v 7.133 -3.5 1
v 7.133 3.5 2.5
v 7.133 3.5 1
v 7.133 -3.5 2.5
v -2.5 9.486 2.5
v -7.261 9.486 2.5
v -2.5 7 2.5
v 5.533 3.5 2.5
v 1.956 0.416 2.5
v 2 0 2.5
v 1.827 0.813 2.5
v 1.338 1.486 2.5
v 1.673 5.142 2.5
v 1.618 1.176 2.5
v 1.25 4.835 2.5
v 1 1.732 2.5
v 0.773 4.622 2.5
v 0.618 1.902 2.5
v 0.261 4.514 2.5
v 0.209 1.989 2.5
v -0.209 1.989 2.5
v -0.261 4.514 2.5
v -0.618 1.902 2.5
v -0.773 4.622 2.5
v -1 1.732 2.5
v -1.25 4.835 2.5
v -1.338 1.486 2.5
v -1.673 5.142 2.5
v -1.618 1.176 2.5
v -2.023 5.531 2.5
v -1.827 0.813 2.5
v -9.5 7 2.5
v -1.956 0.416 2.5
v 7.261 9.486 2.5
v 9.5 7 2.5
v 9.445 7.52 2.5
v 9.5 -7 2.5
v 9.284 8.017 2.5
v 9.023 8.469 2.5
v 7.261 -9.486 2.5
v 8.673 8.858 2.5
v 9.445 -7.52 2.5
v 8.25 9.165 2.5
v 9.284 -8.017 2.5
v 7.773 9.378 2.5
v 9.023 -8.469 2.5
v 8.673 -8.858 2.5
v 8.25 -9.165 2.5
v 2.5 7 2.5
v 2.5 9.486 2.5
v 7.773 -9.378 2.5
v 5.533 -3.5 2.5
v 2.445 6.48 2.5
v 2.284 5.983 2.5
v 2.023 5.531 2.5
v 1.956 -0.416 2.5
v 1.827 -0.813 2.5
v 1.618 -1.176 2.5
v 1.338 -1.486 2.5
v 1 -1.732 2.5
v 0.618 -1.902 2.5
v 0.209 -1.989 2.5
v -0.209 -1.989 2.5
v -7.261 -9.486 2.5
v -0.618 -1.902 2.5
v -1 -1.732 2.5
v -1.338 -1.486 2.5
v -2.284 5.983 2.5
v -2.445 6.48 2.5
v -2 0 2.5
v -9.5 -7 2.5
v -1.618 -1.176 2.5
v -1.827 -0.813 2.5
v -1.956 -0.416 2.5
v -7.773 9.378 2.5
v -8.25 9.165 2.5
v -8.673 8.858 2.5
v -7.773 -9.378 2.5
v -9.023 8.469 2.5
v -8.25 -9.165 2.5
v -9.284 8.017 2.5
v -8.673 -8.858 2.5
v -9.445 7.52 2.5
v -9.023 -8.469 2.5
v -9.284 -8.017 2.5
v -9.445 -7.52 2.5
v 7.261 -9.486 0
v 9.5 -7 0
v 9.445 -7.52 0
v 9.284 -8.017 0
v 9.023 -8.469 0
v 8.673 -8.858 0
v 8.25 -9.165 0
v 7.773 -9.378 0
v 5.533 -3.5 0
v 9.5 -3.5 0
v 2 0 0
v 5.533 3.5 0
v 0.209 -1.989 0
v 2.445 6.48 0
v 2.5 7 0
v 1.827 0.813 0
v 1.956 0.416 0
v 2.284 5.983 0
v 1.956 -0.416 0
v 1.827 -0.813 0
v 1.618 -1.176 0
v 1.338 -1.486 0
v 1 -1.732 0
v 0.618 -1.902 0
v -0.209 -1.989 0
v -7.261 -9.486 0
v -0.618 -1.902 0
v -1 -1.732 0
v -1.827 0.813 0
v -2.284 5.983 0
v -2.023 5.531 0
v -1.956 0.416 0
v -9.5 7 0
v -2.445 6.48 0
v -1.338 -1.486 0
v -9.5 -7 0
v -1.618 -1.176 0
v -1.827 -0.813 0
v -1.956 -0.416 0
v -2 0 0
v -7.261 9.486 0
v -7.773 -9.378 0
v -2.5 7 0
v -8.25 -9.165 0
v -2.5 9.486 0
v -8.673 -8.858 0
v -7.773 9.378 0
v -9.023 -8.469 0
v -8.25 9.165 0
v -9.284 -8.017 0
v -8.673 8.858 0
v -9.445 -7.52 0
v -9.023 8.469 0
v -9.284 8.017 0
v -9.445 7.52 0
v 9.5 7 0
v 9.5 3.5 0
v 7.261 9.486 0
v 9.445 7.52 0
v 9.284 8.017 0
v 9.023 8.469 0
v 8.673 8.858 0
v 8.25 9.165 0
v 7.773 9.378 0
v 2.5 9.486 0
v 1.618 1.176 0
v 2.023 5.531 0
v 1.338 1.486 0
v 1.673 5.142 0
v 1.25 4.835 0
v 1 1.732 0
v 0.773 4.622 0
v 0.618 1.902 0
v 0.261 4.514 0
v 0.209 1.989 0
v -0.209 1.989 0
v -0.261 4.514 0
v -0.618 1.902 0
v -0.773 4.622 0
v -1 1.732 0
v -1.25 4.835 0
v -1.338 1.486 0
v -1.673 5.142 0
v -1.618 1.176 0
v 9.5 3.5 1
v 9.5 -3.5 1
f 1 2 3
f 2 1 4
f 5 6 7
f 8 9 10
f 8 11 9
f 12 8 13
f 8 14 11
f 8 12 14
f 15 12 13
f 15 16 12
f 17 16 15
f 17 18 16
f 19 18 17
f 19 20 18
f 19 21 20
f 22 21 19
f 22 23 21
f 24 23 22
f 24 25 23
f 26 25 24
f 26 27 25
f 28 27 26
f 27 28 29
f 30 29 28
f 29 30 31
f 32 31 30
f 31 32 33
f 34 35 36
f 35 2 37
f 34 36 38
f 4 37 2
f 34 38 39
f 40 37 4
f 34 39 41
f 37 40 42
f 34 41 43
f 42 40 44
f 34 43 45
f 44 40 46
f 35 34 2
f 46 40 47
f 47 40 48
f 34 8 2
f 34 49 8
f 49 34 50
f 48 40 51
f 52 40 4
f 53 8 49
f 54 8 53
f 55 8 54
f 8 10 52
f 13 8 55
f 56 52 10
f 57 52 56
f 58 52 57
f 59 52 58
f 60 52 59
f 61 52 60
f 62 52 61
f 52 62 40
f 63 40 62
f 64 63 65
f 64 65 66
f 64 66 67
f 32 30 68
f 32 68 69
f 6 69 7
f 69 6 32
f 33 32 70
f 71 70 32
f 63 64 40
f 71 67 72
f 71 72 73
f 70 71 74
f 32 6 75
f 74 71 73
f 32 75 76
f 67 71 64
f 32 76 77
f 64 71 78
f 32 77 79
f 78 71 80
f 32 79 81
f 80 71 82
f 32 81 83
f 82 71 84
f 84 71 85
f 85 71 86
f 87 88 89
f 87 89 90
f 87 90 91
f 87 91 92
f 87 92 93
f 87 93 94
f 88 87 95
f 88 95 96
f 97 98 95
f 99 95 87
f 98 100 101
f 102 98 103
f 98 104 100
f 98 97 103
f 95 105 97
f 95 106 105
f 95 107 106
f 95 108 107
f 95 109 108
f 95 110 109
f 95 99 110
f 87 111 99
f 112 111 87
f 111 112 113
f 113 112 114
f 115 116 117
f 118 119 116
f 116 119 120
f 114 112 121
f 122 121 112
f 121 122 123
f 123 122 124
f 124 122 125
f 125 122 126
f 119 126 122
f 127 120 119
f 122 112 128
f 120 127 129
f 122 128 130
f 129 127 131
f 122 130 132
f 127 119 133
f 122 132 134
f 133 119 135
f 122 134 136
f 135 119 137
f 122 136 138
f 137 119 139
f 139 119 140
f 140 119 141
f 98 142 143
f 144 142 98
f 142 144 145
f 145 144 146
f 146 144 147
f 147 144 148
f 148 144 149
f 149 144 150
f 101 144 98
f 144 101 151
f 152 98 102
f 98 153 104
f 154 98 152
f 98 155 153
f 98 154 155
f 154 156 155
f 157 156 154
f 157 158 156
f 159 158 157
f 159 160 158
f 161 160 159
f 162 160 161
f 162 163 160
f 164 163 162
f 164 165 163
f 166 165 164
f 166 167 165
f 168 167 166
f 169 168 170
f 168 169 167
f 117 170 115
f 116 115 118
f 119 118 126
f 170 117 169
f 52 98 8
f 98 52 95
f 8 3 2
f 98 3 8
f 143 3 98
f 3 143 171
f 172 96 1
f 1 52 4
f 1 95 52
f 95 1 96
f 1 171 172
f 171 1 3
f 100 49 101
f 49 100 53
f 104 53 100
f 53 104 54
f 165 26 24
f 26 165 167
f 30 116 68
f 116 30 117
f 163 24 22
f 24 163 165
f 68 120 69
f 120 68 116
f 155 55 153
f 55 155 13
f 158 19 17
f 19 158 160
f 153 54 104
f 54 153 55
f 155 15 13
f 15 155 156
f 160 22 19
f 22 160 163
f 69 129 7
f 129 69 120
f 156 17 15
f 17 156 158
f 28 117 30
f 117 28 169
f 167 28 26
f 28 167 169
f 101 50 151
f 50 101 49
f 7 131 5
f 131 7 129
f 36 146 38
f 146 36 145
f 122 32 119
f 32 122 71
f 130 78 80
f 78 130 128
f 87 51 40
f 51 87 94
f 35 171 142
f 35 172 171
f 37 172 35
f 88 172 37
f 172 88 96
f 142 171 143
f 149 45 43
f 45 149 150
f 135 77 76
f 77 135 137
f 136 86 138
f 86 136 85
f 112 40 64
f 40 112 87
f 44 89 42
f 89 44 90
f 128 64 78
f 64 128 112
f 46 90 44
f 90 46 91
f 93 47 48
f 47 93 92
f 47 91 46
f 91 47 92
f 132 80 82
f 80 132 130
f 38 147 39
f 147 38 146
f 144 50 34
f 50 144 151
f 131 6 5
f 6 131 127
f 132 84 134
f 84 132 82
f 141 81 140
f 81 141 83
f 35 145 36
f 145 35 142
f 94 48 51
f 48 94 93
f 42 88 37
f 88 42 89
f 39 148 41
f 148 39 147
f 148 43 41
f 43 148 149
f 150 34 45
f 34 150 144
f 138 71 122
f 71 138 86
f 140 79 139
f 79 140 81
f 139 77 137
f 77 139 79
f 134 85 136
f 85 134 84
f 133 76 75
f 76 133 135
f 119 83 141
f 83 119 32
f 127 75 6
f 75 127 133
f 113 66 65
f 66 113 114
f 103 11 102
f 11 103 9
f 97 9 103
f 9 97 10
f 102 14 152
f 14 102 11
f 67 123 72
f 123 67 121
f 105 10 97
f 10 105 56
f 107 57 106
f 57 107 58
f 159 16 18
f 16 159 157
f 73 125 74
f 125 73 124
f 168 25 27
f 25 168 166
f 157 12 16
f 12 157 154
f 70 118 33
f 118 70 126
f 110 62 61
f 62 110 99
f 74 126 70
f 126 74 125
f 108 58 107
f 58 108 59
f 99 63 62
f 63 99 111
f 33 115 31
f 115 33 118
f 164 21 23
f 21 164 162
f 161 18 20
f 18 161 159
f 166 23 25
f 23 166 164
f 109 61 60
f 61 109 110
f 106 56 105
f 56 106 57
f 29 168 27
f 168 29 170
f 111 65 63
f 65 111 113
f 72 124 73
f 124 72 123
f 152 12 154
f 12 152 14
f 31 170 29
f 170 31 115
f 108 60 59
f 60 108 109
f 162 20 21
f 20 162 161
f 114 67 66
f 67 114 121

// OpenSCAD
WIDTH = 19;
HEIGHT = 19;
THICKNESS = 2.5;
CORNER_DIA = 5;

MOUNT_DIA = 4;

SLOT_WIDTH = 1.6;
SLOT_LENGTH = 7;
SLOT_GROOVE_THICKNESS = 1;

SLOT = true;

PASSTHROUGH_DIA = 5;

PASSTHROUGH = true;

$fn = 30;

module rounded_cube(width, height, thickness, corner_dia) {
    hull() {
        for(i = [-1, 1]) {
            for(j = [-1, 1]) {
                translate([i * (width - corner_dia)/2, j * (height - corner_dia)/2, 0])
                cylinder(d = corner_dia, h = thickness);
            }
        }
    }
}

module base() {
    rounded_cube(WIDTH, HEIGHT, THICKNESS, CORNER_DIA);
}

module mount_neg() {
    cylinder(d = MOUNT_DIA, h = THICKNESS);
}

module slot_neg() {
    union() {
        translate([-SLOT_WIDTH/2, -SLOT_LENGTH/2, 0])
        cube(size = [SLOT_WIDTH, SLOT_LENGTH, THICKNESS]);
        translate([-SLOT_WIDTH/2, -SLOT_LENGTH/2, 0])
        cube(size = [100000, SLOT_LENGTH, SLOT_GROOVE_THICKNESS]);
    }
}

module passthrough_neg() {
    union() {
        cylinder(d = PASSTHROUGH_DIA, h = THICKNESS);
        translate([-PASSTHROUGH_DIA/2, 0, 0])
        cube(size = [PASSTHROUGH_DIA, PASSTHROUGH_DIA, THICKNESS]);
    }
}

difference() {
    base();
    mount_neg();
    
    if(SLOT) {
        translate([HEIGHT/3, 0, 0])
        slot_neg();
    }
    
    if(PASSTHROUGH) {
        translate([0, (WIDTH-PASSTHROUGH_DIA)/2, 0])
        passthrough_neg();
    }
    
}
